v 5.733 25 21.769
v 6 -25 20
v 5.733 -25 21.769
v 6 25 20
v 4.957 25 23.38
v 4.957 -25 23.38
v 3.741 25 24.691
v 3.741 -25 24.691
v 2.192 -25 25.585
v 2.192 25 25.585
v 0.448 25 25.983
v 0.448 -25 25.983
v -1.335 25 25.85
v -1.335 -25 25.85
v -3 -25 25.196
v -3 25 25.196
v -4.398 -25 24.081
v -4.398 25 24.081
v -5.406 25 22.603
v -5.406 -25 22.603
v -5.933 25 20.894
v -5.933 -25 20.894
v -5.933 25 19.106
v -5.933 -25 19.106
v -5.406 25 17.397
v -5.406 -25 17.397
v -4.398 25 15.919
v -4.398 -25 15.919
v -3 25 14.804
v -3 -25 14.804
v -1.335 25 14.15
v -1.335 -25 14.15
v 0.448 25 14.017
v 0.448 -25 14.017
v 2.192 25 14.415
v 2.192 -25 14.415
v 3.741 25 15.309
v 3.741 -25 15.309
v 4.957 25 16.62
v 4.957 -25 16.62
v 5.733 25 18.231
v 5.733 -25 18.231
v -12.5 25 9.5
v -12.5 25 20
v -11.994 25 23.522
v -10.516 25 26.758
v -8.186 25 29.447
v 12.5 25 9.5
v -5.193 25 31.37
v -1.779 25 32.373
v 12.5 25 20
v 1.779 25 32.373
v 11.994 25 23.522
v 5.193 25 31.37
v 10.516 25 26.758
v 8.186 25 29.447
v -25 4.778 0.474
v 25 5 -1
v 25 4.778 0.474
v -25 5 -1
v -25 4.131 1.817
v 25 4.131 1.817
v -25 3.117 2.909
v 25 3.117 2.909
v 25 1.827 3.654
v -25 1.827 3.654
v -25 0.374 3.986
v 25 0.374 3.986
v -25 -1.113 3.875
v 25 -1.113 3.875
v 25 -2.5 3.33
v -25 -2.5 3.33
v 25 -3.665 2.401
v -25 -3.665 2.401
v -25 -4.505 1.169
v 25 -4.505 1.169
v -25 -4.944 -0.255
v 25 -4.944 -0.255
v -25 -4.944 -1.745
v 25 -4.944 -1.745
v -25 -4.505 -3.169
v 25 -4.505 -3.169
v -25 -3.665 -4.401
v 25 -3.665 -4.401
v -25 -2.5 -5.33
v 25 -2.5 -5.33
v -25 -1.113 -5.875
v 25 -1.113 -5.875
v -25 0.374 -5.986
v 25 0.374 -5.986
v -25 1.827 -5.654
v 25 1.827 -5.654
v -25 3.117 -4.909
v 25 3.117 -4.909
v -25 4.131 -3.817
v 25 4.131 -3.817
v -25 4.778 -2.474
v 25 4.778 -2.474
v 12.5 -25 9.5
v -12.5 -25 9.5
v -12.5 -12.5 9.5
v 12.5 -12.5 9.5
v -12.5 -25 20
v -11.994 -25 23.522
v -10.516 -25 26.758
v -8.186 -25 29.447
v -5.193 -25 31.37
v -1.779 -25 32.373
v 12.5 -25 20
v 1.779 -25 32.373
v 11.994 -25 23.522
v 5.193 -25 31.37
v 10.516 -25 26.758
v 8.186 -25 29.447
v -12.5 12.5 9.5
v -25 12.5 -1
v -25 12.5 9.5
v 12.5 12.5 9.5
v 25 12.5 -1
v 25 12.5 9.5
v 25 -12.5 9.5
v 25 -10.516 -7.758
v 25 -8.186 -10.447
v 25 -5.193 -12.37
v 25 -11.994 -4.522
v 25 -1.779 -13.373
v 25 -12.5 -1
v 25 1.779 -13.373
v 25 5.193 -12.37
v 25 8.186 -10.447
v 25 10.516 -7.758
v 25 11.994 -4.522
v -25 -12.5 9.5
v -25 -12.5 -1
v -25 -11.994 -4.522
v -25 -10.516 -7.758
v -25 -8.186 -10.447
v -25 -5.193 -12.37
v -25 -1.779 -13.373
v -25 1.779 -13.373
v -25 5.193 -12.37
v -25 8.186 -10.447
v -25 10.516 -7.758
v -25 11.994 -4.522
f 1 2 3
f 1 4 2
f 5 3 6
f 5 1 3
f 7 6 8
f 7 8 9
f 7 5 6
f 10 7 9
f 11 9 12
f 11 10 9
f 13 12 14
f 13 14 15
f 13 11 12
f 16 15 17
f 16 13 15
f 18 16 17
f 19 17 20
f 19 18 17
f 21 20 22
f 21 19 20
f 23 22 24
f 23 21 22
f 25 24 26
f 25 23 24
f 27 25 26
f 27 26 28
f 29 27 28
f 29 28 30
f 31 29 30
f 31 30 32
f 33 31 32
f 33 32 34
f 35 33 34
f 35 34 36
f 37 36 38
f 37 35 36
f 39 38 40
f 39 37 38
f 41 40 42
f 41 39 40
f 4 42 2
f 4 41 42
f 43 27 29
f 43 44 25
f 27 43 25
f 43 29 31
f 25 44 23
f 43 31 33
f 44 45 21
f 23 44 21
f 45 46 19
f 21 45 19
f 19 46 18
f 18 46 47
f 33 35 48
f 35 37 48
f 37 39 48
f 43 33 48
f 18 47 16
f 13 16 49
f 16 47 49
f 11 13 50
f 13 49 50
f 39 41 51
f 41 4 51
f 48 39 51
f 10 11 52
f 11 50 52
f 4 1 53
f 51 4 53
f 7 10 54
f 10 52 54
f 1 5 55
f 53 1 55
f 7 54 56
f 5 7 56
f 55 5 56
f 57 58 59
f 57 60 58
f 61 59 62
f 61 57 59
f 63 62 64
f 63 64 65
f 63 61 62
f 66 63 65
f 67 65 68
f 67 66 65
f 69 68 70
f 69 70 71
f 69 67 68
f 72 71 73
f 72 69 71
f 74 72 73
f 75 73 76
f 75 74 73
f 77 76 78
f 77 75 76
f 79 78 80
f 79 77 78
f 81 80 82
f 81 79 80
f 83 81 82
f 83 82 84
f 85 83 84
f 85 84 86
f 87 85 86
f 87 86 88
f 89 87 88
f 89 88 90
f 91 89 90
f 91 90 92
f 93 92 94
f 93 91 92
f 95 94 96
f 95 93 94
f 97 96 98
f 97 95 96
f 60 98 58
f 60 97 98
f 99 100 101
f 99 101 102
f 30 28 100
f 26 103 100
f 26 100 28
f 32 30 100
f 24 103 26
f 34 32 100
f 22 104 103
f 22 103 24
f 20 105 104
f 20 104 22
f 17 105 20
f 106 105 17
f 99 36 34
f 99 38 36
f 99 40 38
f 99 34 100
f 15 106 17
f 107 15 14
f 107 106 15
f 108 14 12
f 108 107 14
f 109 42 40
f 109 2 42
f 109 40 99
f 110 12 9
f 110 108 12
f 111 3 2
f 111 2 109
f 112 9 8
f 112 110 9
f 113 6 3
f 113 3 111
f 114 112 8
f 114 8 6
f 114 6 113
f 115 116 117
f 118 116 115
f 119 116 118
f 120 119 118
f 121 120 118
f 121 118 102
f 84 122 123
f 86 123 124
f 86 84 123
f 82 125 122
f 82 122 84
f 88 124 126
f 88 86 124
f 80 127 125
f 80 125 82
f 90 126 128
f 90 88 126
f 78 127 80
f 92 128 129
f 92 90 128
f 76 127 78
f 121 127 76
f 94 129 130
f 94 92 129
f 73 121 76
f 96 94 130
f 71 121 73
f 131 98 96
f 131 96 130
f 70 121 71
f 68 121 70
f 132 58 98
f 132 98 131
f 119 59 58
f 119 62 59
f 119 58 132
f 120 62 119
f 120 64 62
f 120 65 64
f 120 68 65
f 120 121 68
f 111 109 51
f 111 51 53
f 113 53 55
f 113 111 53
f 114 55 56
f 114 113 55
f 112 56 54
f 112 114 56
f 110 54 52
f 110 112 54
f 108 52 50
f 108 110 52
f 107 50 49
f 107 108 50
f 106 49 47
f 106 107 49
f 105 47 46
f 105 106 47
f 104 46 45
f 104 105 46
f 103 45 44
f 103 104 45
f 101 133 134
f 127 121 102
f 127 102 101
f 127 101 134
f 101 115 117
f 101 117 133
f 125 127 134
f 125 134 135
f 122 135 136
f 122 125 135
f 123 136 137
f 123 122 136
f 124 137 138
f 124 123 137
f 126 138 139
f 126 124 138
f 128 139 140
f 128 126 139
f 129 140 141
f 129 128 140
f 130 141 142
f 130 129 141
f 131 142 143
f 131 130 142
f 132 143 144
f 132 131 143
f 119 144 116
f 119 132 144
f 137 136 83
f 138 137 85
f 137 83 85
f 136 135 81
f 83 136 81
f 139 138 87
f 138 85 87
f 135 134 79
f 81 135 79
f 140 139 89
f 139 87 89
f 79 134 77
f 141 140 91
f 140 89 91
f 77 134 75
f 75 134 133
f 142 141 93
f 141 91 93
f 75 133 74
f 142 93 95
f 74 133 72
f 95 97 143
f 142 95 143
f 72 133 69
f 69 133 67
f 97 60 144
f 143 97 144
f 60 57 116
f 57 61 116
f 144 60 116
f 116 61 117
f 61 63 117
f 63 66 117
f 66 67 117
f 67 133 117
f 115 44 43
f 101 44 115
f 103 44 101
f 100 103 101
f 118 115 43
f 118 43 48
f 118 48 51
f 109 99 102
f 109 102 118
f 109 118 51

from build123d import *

# Parameters (mm, degrees)
F0_R     = 6
F1_DEPTH = 25
F2_R     = 5
F3_DEPTH = 25


# Not quite as in the source:
# - a feature names something its author has since deleted; it is built from what else it names


with BuildPart() as f1:
    # F0 (on Front) → F1 (new body, symmetric)
    with BuildSketch(Plane.XZ):
        with BuildLine():
            ThreePointArc((6.7823299831, 9.5), (10.9779124789, 14.0220875211), (12.5, 20))
            ThreePointArc((12.5, 20), (0, 32.5), (-12.5, 20))
            ThreePointArc((-12.5, 20), (-10.9779124789, 14.0220875211), (-6.7823299831, 9.5))
            Line((-6.7823299831, 9.5), (6.7823299831, 9.5))
        make_face()
        with Locations((0, 20)):
            Circle(F0_R, mode=Mode.SUBTRACT)
        with BuildLine():
            Line((12.5, 9.5), (12.5, 20))
            ThreePointArc((12.5, 20), (10.9779124789, 14.0220875211), (6.7823299831, 9.5))
            Line((6.7823299831, 9.5), (12.5, 9.5))
        make_face()
        with BuildLine():
            ThreePointArc((-6.7823299831, 9.5), (-10.9779124789, 14.0220875211), (-12.5, 20))
            Line((-12.5, 20), (-12.5, 9.5))
            Line((-12.5, 9.5), (-6.7823299831, 9.5))
        make_face()
    extrude(amount=F1_DEPTH, both=True)

    # F2 (on Right) → F3 (join, symmetric)
    with BuildSketch(Plane.YZ):
        with BuildLine():
            ThreePointArc((-6.7823299831, 9.5), (-10.9779124789, 4.9779124789), (-12.5, -1))
            ThreePointArc((-12.5, -1), (0, -13.5), (12.5, -1))
            ThreePointArc((12.5, -1), (10.9779124789, 4.9779124789), (6.7823299831, 9.5))
            Line((6.7823299831, 9.5), (-6.7823299831, 9.5))
        make_face()
        with Locations((0, -1)):
            Circle(F2_R, mode=Mode.SUBTRACT)
        with BuildLine():
            Line((-12.5, 9.5), (-12.5, -1))
            ThreePointArc((-12.5, -1), (-10.9779124789, 4.9779124789), (-6.7823299831, 9.5))
            Line((-6.7823299831, 9.5), (-12.5, 9.5))
        make_face()
        with BuildLine():
            ThreePointArc((6.7823299831, 9.5), (10.9779124789, 4.9779124789), (12.5, -1))
            Line((12.5, -1), (12.5, 9.5))
            Line((12.5, 9.5), (6.7823299831, 9.5))
        make_face()
    extrude(amount=F3_DEPTH, both=True)


solid = f1.part
